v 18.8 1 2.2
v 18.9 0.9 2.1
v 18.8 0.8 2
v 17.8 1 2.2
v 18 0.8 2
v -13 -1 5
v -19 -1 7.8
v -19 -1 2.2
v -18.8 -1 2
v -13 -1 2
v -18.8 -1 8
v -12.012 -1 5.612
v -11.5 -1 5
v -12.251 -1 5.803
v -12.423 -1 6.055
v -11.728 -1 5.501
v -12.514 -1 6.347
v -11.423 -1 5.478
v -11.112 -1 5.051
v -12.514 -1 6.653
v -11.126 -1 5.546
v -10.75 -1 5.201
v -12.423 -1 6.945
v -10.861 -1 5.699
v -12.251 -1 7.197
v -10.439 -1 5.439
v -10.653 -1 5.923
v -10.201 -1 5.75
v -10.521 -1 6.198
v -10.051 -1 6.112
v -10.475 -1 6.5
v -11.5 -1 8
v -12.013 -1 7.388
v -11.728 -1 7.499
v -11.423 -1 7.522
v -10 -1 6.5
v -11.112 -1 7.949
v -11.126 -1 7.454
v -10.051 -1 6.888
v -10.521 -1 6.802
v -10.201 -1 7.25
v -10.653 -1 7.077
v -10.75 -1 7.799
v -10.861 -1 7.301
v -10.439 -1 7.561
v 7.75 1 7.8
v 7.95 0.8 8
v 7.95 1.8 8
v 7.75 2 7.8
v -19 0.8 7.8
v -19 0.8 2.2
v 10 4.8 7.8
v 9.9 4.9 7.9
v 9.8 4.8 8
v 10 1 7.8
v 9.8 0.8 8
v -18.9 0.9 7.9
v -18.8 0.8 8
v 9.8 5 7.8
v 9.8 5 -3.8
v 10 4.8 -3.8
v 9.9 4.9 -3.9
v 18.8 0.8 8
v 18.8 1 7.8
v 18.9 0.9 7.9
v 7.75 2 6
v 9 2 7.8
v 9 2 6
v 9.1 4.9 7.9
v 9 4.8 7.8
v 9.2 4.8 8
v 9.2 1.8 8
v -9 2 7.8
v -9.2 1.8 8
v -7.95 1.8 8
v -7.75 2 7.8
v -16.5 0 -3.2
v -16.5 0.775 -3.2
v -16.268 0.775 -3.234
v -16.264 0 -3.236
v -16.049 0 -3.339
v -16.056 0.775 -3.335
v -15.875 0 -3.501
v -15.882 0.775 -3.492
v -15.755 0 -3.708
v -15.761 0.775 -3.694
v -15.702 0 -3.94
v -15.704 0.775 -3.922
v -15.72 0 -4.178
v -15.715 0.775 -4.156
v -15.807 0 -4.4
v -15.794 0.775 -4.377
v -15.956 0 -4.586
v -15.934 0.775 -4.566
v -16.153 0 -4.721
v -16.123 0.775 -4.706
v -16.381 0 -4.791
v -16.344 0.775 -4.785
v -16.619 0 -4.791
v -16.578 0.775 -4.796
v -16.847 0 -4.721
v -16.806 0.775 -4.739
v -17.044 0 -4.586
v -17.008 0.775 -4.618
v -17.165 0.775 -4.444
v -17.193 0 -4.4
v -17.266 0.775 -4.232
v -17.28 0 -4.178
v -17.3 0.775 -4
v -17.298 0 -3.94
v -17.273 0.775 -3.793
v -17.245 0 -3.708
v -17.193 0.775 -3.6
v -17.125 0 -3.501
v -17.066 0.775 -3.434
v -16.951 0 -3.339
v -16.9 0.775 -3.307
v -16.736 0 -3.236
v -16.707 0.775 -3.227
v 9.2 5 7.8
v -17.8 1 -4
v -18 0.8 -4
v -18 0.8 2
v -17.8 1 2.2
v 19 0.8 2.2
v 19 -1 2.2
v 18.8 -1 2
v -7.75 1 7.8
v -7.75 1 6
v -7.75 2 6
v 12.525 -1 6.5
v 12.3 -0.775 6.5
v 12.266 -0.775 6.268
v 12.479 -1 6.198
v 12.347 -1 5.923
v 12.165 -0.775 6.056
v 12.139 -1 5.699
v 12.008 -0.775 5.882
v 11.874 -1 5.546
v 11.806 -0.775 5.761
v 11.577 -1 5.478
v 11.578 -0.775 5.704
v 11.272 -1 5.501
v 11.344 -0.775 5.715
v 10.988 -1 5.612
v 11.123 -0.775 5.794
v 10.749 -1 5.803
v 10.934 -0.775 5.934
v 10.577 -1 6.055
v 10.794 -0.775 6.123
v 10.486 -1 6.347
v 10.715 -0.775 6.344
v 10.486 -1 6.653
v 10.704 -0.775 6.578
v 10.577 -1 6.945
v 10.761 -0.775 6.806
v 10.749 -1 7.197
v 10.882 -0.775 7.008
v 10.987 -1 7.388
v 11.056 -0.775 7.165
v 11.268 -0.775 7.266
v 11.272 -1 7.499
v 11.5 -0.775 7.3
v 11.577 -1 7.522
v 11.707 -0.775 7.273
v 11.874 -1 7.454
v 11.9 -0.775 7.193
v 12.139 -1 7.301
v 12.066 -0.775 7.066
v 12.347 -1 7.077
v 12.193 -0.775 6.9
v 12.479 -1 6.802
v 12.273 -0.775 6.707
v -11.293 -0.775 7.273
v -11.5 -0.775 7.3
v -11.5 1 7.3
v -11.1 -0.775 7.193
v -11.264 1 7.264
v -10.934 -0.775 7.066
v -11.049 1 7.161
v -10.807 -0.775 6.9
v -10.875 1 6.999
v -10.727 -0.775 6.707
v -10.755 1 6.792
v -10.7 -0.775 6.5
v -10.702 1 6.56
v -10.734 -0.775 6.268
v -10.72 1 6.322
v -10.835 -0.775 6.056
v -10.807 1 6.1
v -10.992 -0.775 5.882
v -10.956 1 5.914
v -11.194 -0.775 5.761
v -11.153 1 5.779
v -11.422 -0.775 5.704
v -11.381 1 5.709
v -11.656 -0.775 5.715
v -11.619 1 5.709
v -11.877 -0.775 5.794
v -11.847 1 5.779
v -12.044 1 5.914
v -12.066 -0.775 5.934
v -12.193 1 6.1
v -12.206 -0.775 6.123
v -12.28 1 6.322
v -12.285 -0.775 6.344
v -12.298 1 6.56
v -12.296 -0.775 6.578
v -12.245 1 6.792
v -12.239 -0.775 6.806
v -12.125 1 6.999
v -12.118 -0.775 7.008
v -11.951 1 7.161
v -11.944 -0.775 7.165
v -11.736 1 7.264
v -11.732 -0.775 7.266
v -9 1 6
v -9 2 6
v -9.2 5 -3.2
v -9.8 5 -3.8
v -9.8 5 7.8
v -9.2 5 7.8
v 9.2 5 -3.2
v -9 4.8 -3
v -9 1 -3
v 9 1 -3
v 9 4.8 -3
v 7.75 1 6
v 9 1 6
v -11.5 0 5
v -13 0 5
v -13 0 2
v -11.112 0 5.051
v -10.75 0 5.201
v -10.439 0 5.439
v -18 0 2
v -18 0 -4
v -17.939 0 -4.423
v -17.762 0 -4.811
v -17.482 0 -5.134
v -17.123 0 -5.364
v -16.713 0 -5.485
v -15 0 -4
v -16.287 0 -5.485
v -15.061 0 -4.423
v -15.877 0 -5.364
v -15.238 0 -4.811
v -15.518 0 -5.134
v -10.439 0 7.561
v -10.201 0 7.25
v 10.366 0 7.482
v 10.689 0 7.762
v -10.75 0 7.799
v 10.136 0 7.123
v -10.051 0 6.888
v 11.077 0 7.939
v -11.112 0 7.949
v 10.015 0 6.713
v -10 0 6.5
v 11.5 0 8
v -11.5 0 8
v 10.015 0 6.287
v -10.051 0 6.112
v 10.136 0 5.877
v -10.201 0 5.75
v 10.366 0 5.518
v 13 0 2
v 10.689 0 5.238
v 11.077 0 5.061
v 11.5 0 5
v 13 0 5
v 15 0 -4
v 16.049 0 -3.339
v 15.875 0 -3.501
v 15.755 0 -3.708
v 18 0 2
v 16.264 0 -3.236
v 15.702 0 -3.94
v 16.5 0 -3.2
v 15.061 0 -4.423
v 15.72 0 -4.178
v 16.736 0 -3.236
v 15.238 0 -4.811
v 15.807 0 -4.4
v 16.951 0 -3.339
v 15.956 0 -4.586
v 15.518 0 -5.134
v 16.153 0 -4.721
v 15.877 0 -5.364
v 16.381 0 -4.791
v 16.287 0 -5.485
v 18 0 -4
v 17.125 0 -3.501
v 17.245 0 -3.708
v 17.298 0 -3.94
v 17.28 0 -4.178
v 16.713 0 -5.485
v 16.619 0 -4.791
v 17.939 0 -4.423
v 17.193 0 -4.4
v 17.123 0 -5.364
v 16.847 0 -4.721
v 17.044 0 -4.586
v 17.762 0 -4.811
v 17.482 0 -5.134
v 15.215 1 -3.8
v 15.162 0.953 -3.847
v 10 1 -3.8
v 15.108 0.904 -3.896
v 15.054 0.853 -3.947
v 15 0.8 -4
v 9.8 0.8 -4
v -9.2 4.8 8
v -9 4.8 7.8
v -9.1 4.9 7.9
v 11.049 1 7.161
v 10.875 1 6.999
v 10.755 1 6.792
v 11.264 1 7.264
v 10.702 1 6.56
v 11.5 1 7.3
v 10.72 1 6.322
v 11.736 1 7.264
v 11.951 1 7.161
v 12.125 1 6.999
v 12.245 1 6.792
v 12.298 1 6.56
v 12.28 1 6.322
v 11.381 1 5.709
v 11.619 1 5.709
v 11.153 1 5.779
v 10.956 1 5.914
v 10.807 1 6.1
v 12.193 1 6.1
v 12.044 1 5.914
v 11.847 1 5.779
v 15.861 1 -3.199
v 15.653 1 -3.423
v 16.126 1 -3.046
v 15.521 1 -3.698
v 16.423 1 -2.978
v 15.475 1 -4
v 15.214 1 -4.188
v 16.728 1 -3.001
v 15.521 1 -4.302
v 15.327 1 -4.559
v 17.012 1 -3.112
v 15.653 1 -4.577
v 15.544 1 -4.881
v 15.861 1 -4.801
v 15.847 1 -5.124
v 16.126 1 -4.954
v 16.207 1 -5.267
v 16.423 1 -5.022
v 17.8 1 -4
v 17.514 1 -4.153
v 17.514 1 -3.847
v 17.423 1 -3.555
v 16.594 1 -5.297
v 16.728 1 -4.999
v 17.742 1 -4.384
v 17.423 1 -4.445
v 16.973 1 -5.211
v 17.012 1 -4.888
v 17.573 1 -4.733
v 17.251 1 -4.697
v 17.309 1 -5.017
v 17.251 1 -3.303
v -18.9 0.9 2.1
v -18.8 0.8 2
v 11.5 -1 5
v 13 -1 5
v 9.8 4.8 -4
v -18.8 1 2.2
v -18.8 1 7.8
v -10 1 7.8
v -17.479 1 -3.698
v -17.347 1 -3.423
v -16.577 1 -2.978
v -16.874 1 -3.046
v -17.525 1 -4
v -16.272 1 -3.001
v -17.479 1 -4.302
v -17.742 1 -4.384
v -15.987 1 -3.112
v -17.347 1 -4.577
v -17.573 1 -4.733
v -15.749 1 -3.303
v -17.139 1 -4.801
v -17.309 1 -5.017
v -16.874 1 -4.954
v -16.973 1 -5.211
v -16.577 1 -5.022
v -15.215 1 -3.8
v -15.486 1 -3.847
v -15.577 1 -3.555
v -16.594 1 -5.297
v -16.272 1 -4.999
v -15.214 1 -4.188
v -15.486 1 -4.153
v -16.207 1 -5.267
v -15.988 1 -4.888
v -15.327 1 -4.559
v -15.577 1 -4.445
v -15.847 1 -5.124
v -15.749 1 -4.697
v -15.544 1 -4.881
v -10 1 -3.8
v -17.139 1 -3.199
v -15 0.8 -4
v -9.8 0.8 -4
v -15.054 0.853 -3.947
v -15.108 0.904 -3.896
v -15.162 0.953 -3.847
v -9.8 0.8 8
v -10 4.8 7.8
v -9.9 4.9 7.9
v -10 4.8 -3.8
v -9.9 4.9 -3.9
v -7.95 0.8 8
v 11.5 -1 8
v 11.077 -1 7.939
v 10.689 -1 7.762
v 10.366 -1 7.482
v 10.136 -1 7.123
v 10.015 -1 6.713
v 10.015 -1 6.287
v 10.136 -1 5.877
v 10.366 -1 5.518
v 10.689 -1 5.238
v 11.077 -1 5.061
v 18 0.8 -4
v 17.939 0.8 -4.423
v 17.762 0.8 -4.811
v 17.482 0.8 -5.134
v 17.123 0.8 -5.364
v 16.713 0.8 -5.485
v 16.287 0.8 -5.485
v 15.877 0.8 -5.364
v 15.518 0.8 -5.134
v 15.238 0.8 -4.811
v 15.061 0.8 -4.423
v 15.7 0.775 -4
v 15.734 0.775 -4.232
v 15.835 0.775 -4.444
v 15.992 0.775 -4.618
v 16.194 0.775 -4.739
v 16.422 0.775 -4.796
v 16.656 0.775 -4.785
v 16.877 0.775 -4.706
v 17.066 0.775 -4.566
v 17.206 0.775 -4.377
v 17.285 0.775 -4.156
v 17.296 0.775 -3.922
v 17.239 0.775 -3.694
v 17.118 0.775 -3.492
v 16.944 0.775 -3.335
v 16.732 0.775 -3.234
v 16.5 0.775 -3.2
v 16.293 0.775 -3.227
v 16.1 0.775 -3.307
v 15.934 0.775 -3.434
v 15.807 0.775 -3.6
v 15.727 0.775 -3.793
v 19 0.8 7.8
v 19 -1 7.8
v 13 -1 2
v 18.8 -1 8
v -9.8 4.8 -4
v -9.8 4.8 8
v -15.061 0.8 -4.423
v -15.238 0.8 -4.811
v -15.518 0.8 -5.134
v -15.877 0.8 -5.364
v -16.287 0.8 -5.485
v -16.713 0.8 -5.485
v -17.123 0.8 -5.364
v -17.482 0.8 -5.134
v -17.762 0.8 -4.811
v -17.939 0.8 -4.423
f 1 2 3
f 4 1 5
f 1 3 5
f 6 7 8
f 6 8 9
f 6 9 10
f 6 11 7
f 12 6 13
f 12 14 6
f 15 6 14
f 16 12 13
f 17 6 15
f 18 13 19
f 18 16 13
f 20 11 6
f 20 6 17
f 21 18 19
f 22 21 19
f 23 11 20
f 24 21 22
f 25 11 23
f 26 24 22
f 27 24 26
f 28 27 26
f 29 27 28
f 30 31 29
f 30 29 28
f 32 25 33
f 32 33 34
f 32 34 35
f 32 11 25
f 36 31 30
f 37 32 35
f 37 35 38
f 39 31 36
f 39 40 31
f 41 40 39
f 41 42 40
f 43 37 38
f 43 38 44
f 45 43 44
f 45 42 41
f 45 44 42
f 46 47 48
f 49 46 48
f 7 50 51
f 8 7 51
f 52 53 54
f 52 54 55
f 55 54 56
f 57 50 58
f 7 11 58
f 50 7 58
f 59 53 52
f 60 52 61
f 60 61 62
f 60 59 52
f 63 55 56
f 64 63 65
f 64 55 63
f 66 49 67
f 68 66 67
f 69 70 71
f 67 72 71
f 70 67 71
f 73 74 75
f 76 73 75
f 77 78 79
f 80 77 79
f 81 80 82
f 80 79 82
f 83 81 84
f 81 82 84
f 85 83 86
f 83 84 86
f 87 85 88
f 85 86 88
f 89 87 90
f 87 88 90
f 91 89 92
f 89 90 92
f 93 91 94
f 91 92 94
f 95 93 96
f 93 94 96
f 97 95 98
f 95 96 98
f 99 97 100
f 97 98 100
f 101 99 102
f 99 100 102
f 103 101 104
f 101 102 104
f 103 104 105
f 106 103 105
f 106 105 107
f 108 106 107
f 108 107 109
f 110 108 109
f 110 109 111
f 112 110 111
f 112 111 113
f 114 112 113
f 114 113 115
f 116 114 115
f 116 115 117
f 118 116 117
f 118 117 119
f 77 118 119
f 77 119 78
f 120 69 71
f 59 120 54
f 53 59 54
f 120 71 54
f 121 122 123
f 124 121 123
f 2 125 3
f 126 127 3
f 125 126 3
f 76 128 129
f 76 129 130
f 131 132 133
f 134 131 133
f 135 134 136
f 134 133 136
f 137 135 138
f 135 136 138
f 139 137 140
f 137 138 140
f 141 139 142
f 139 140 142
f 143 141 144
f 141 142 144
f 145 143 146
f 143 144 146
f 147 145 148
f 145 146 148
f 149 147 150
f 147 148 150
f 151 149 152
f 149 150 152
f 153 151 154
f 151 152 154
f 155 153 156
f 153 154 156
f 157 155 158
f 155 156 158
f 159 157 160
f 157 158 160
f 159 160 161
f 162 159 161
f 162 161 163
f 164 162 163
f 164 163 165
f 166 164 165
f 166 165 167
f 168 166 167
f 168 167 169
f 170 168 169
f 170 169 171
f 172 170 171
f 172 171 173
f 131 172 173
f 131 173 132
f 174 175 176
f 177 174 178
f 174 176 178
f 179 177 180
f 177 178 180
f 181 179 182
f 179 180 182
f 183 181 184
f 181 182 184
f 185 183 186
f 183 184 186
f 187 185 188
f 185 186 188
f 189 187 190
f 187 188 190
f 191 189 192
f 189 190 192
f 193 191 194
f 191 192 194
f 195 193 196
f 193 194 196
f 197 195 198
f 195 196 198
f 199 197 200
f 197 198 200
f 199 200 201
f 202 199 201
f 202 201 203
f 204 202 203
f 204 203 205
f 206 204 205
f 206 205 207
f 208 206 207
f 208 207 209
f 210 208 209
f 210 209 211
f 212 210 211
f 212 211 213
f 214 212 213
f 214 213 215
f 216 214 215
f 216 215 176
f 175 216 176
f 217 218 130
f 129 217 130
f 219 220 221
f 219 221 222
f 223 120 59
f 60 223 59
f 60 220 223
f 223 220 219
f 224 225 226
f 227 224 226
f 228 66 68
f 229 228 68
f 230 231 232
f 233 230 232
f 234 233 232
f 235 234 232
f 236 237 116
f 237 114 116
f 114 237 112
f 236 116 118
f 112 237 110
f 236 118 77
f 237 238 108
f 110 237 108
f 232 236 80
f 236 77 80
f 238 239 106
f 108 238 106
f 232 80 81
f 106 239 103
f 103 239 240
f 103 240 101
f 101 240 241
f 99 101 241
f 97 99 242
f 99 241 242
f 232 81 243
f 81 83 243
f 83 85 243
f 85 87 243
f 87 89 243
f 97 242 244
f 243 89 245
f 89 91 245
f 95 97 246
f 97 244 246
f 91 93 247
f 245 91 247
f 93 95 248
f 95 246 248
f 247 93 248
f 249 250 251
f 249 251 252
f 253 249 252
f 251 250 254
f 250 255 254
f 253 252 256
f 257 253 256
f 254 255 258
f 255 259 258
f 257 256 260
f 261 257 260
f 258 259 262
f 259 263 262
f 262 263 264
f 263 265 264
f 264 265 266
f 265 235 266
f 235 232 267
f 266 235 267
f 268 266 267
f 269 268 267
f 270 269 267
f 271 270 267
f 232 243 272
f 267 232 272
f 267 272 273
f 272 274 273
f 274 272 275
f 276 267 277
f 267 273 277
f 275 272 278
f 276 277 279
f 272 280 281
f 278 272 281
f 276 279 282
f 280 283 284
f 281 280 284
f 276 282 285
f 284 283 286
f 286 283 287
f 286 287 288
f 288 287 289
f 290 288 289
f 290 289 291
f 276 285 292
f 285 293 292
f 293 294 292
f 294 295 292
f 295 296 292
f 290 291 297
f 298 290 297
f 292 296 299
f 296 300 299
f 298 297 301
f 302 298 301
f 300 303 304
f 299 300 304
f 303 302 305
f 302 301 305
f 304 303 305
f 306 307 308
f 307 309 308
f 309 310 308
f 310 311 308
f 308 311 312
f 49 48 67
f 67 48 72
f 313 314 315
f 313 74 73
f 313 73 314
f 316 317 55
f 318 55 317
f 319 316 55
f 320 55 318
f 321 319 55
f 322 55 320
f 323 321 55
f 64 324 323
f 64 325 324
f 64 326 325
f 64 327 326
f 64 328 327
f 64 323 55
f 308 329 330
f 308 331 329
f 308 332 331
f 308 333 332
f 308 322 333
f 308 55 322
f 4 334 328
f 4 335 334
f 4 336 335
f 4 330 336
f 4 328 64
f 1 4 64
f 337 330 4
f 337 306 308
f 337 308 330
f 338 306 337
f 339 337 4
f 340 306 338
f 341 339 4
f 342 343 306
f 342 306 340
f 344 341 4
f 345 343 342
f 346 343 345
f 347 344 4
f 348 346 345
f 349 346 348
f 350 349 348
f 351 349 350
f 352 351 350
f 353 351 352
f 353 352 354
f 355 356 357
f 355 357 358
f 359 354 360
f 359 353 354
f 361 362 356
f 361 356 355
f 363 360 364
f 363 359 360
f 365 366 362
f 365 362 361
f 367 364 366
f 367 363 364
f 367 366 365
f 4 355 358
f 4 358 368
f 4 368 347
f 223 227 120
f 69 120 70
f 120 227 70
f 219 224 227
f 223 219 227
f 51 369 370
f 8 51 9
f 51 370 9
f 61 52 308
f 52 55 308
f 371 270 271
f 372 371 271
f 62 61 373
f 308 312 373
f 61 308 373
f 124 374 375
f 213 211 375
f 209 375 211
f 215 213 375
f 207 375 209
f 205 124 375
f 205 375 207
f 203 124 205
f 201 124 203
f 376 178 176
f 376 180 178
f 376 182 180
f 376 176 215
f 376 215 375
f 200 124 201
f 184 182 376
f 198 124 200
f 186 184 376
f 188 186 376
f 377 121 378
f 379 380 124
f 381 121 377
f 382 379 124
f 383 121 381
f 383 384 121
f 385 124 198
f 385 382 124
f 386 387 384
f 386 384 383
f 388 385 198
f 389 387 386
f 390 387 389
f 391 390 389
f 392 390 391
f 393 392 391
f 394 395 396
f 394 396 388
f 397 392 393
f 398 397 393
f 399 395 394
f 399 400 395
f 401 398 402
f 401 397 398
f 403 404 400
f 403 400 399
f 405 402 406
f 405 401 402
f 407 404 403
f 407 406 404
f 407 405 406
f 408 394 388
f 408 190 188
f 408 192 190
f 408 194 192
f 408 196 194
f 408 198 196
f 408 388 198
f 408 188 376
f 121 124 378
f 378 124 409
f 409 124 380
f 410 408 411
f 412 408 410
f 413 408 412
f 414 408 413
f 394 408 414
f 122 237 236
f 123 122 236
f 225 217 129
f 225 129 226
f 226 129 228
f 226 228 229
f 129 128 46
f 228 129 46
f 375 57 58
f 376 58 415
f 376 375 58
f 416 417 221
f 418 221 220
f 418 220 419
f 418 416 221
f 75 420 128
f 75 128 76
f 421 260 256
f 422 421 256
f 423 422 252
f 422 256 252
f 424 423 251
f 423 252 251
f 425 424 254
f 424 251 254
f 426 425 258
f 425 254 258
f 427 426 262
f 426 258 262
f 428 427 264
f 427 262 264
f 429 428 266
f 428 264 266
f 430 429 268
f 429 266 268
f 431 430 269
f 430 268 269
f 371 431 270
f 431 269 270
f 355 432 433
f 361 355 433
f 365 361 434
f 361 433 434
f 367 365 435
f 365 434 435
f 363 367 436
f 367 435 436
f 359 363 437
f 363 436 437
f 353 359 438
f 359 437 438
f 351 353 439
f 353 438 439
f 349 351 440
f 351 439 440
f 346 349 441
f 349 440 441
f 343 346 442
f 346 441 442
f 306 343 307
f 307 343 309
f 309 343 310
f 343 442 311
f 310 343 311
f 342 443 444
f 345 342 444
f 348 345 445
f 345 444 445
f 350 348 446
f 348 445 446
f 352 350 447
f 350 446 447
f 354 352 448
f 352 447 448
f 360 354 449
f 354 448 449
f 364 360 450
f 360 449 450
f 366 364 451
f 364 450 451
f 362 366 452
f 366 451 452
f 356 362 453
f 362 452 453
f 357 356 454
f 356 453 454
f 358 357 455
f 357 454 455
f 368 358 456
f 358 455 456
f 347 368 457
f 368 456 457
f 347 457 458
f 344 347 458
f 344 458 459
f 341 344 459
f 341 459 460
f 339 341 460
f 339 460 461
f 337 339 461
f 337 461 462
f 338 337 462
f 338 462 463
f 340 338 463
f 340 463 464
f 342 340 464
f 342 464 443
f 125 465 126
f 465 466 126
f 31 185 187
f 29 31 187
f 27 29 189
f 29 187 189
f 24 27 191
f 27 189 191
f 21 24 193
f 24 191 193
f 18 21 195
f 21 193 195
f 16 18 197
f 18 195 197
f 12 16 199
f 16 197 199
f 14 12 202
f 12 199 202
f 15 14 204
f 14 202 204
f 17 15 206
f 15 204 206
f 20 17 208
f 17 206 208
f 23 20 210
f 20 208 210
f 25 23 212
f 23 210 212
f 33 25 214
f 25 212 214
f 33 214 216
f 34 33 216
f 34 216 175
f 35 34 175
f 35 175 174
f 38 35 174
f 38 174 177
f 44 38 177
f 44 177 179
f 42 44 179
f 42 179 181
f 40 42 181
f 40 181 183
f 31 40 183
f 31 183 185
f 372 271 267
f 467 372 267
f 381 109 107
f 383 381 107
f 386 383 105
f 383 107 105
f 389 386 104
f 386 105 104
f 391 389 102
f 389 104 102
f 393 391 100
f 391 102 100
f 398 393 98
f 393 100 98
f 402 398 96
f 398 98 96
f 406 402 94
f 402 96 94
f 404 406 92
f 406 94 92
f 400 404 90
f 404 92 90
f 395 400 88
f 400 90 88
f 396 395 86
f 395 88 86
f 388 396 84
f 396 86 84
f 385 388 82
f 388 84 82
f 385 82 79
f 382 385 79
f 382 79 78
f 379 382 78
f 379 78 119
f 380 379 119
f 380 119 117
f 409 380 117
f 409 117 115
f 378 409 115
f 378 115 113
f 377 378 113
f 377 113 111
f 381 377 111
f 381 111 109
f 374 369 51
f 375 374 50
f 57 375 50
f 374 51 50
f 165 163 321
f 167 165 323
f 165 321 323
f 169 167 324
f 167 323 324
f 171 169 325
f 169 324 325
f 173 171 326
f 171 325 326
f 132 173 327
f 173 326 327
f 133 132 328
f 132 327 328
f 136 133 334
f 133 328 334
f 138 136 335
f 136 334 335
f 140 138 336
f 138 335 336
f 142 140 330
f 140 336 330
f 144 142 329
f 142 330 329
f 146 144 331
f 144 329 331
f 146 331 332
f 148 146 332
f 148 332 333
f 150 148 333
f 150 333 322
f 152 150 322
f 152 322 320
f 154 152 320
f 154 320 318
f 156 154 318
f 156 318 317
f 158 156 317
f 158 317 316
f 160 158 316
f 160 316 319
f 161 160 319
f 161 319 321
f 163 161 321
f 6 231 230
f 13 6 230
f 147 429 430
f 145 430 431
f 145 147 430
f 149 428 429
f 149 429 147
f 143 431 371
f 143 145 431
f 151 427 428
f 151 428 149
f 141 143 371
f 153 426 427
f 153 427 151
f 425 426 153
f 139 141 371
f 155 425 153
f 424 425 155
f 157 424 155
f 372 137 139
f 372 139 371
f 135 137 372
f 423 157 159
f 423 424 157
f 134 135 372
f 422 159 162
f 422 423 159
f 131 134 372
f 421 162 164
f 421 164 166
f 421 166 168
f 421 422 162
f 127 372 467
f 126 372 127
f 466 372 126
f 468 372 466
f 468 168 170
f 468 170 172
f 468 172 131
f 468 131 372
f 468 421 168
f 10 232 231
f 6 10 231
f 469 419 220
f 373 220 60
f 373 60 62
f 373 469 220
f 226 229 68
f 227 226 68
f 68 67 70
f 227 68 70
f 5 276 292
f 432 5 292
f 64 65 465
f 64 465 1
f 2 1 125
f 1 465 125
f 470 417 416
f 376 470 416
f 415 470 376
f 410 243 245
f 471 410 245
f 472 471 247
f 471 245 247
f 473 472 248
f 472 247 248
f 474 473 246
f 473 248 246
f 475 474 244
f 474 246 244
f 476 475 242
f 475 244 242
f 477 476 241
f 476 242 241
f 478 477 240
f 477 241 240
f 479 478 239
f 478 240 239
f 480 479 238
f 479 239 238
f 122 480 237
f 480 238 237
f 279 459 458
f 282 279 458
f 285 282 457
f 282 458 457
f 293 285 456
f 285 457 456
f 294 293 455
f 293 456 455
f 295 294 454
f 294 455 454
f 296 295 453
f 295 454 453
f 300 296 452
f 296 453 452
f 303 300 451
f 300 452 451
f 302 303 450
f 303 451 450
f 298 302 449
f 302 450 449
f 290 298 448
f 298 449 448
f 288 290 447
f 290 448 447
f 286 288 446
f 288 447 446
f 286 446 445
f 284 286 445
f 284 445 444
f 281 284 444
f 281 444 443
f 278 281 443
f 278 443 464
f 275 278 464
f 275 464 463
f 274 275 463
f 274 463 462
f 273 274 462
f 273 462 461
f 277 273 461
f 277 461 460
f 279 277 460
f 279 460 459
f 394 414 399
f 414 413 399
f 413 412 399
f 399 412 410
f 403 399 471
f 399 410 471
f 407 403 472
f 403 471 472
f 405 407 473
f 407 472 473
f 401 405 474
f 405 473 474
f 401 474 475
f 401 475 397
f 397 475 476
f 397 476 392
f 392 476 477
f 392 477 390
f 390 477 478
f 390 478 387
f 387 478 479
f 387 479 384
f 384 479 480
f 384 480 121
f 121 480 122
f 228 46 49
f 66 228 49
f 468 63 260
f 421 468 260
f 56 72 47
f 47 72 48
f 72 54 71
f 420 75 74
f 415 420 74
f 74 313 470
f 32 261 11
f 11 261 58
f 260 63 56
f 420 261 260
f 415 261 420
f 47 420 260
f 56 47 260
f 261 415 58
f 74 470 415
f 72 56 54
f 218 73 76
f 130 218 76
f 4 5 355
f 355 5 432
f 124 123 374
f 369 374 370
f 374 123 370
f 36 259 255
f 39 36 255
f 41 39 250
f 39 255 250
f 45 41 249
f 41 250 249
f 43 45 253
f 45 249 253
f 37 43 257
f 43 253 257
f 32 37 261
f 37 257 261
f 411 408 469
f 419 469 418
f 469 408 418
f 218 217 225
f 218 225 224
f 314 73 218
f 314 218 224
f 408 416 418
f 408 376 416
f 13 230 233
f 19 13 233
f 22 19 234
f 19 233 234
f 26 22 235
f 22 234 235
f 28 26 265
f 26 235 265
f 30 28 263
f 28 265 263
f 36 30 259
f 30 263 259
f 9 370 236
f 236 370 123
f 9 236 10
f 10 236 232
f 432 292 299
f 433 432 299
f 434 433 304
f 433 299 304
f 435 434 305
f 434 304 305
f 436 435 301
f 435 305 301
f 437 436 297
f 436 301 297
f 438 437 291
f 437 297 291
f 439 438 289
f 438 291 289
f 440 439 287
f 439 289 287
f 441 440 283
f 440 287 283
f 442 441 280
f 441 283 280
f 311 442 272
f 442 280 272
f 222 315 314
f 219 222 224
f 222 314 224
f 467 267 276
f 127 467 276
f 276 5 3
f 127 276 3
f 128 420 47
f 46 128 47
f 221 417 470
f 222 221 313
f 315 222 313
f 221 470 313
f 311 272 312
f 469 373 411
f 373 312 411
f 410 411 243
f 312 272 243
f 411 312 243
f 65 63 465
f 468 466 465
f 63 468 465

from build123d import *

# Parameters (mm, degrees)
SKETCH_1_W                   = 3
SKETCH_1_H                   = 1
SKETCH_1_H_2                 = 2
SKETCH_1_W_2                 = 30
EXTRUDE_1_DEPTH              = 1
SKETCH_2_W                   = 20
SKETCH_2_H                   = 12
SKETCH_2_W_2                 = 18
SKETCH_2_H_2                 = 10
EXTRUDE_4_DEPTH              = 4
SKETCH_8_W                   = 18
SKETCH_8_H                   = 4
CUT_EXTRUDE_2_DEPTH          = 4
SKETCH_9_W                   = 1.25
SKETCH_9_H                   = 1
EXTRUDE_5_DEPTH              = 2
EXTRUDE_6_DEPTH              = 1
HOLE_WIZARD_M2_1_D           = 1.6
HOLE_WIZARD_M2_1_DEPTH       = 5.5
HOLE_WIZARD_M2_1_CSINK_D     = 2.05
HOLE_WIZARD_M2_1_CSINK_ANGLE = 90
HOLE_WIZARD_M2_1_TIP         = 0.480688495
HOLE_WIZARD_M2_2_D           = 1.6
HOLE_WIZARD_M2_2_CSINK_D     = 2.05
HOLE_WIZARD_M2_2_CSINK_ANGLE = 90
CHAMFER_1_SIZE               = 0.2
CHAMFER_2_SIZE               = 0.2
CHAMFER_3_SIZE               = 0.2
CHAMFER_4_SIZE               = 0.2
CHAMFER_5_SIZE               = 0.2
SKETCH_16_R                  = 0.8
EXTRUDE_7_DEPTH              = 3
SKETCH_17_R                  = 0.8
CUT_EXTRUDE_3_DEPTH          = 22


with BuildPart() as part:
    # 草图1 → 凸台-拉伸1 (new body)
    with BuildSketch(Plane(origin=(0, 0, 0), x_dir=(1, 0, 0), z_dir=(0, 1, 0))):
        with BuildLine():
            ThreePointArc((-15, 4), (-16.5, 5.5), (-18, 4))
            Line((-18, 4), (-15, 4))
        make_face()
        with BuildLine():
            ThreePointArc((-15, 4), (-16.5, 2.5), (-18, 4))
            Line((-18, 4), (-18, -1))
            Line((-18, -1), (-15, -1))
            Line((-15, -1), (-15, -2))
            Line((-15, -2), (15, -2))
            Line((15, -2), (15, -1))
            Line((15, -1), (18, -1))
            Line((18, -1), (18, 4))
            ThreePointArc((18, 4), (16.5, 2.5), (15, 4))
            Line((15, 4), (-15, 4))
        make_face()
        with BuildLine():
            Line((-15, 4), (-18, 4))
            ThreePointArc((-18, 4), (-16.5, 2.5), (-15, 4))
        make_face()
        with Locations((-16.5, -1.5)):
            Rectangle(SKETCH_1_W, SKETCH_1_H)
        with BuildLine():
            ThreePointArc((18, 4), (16.5, 5.5), (15, 4))
            Line((15, 4), (18, 4))
        make_face()
        with BuildLine():
            Line((18, 4), (15, 4))
            ThreePointArc((15, 4), (16.5, 2.5), (18, 4))
        make_face()
        with Locations((-16.5, -3)):
            Rectangle(SKETCH_1_W, SKETCH_1_H_2)
        Polygon((-18, -4), (-18, -2), (-19, -2), (-19, -8), (19, -8), (19, -2), (18, -2), (18, -4), (15, -4), (-15, -4), align=None)
        with Locations((0, -3)):
            Rectangle(SKETCH_1_W_2, SKETCH_1_H_2)
        with Locations((16.5, -1.5)):
            Rectangle(SKETCH_1_W, SKETCH_1_H)
        with Locations((16.5, -3)):
            Rectangle(SKETCH_1_W, SKETCH_1_H_2)
    extrude(amount=EXTRUDE_1_DEPTH)

    # 草图2 → 凸台-拉伸4 (add)
    with BuildSketch(Plane(origin=(0, 1, 0), x_dir=(1, 0, 0), z_dir=(0, 1, 0))):
        with Locations((0, -2)):
            Rectangle(SKETCH_2_W, SKETCH_2_H)
        with Locations((0, -2)):
            Rectangle(SKETCH_2_W_2, SKETCH_2_H_2, mode=Mode.SUBTRACT)
    extrude(amount=EXTRUDE_4_DEPTH)

    # 草图8 → 切除-拉伸2 (cut)
    with BuildSketch(Plane.XY.offset(8)):
        with Locations((0, 3)):
            Rectangle(SKETCH_8_W, SKETCH_8_H)
    extrude(amount=-CUT_EXTRUDE_2_DEPTH, mode=Mode.SUBTRACT)

    # 草图9 → 凸台-拉伸5 (add)
    with BuildSketch(Plane.XY.offset(8)):
        with Locations((-8.375, 1.5)):
            Rectangle(SKETCH_9_W, SKETCH_9_H)
        with Locations((8.375, 1.5)):
            Rectangle(SKETCH_9_W, SKETCH_9_H)
    extrude(amount=-EXTRUDE_5_DEPTH)

    # 草图10 → 凸台-拉伸6 (add)
    with BuildSketch(Plane.XZ):
        Polygon((-13, 8), (-19, 8), (-19, 2), (-18, 2), (-13, 2), (-13, 5), (-13, 6.5), align=None)
        with BuildLine():
            ThreePointArc((-11.5, 5), (-12.560660172, 5.439339828), (-13, 6.5))
            Line((-13, 6.5), (-13, 5))
            Line((-13, 5), (-11.5, 5))
        make_face()
        with BuildLine():
            ThreePointArc((-11.5, 8), (-12.560660172, 7.560660172), (-13, 6.5))
            ThreePointArc((-13, 6.5), (-12.560660172, 5.439339828), (-11.5, 5))
            Line((-11.5, 5), (-11.5, 8))
        make_face()
        with BuildLine():
            ThreePointArc((-10, 6.5), (-10.439339828, 7.560660172), (-11.5, 8))
            Line((-11.5, 8), (-11.5, 5))
            ThreePointArc((-11.5, 5), (-10.439339828, 5.439339828), (-10, 6.5))
        make_face()
        with BuildLine():
            Line((-11.5, 8), (-13, 8))
            Line((-13, 8), (-13, 6.5))
            ThreePointArc((-13, 6.5), (-12.560660172, 7.560660172), (-11.5, 8))
        make_face()
        with BuildLine():
            ThreePointArc((13, 6.5), (12.560660172, 7.560660172), (11.5, 8))
            Line((11.5, 8), (11.5, 5))
            ThreePointArc((11.5, 5), (12.560660172, 5.439339828), (13, 6.5))
        make_face()
        with BuildLine():
            Line((11.5, 5), (11.5, 8))
            ThreePointArc((11.5, 8), (10, 6.5), (11.5, 5))
        make_face()
        with BuildLine():
            Line((13, 8), (11.5, 8))
            ThreePointArc((11.5, 8), (12.560660172, 7.560660172), (13, 6.5))
            Line((13, 6.5), (13, 8))
        make_face()
        with BuildLine():
            ThreePointArc((13, 6.5), (12.560660172, 5.439339828), (11.5, 5))
            Line((11.5, 5), (13, 5))
            Line((13, 5), (13, 6.5))
        make_face()
        Polygon((19, 8), (13, 8), (13, 6.5), (13, 5), (13, 2), (18, 2), (19, 2), align=None)
    extrude(amount=EXTRUDE_6_DEPTH)

    # M2 螺纹孔1
    with Locations(Plane(origin=(0, 1, 0), x_dir=(1, 0, 0), z_dir=(0, 1, 0))):
        with Locations((-16.5, 4), (16.5, 4)):
            CounterSinkHole(HOLE_WIZARD_M2_1_D / 2, HOLE_WIZARD_M2_1_CSINK_D / 2, depth=HOLE_WIZARD_M2_1_DEPTH, counter_sink_angle=HOLE_WIZARD_M2_1_CSINK_ANGLE)
            with Locations((0, 0, -(HOLE_WIZARD_M2_1_DEPTH + HOLE_WIZARD_M2_1_TIP / 2))):  # 118° drill point
                Cone(0, HOLE_WIZARD_M2_1_D / 2, HOLE_WIZARD_M2_1_TIP, mode=Mode.SUBTRACT)

    # M2 螺纹孔2 (through all)
    with Locations(Plane(origin=(0, -1, 0), x_dir=(-1, 0, 0), z_dir=(0, -1, 0))):
        with Locations((11.5, -6.5), (-11.5, -6.5)):
            CounterSinkHole(HOLE_WIZARD_M2_2_D / 2, HOLE_WIZARD_M2_2_CSINK_D / 2, counter_sink_angle=HOLE_WIZARD_M2_2_CSINK_ANGLE)

    # 倒角1
    chamfer_1_edges = [part.edges().sort_by_distance(p)[0] for p in [
        (-10, 5, 2),
        (-9.5, 5, 8),
        (10, 5, 2),
        (0, 5, -4),
        (0, 5, -3),
        (-9, 5, 2.5),
        (9, 5, 2.5),
        (9.5, 5, 8),
    ]]
    chamfer(chamfer_1_edges, length=CHAMFER_1_SIZE)

    # 倒角2
    chamfer_2_edges = [part.edges().sort_by_distance(p)[0] for p in [
        (-18, 1, -1),
        (-18.5, 1, 2),
        (-19, 1, 5),
        (-14.5, 1, 8),
        (19, 1, 5),
        (18.5, 1, 2),
        (12.5, 1, -4),
        (14.5, 1, 8),
        (18, 1, -1),
        (-12.5, 1, -4),
        (16.5, 1, -5.5),
        (-16.5, 1, -5.5),
    ]]
    chamfer(chamfer_2_edges, length=CHAMFER_2_SIZE)

    # 倒角3
    chamfer_3_edges = [part.edges().sort_by_distance(p)[0] for p in [
        (7.75, 1.5, 8),
        (-9, 3.4, 8),
        (-10, 2.8, 8),
        (10, 2.8, 8),
        (0, 1, 8),
        (-7.75, 1.5, 8),
        (-8.375, 2, 8),
        (9, 3.4, 8),
        (8.375, 2, 8),
    ]]
    chamfer(chamfer_3_edges, length=CHAMFER_3_SIZE)

    # 倒角4
    chamfer_4_edges = [part.edges().sort_by_distance(p)[0] for p in [
        (-19, -0.1, 8),
        (19, -0.1, 8),
        (-19, -0.1, 2),
        (19, -0.1, 2),
    ]]
    chamfer(chamfer_4_edges, length=CHAMFER_4_SIZE)

    # 倒角5
    chamfer_5_edges = [part.edges().sort_by_distance(p)[0] for p in [
        (-10, 2.8, -4),
        (10, 2.8, -4),
    ]]
    chamfer(chamfer_5_edges, length=CHAMFER_5_SIZE)

    # 草图16 → 凸台-拉伸7 (add)
    with BuildSketch(Plane(origin=(0, 1, 0), x_dir=(1, 0, 0), z_dir=(0, 1, 0))):
        with Locations(Location((16.5, 4, 0), (0, 0, 270))):
            Circle(SKETCH_16_R)
        with Locations(Location((11.5, -6.5, 0), (0, 0, 270))):
            Circle(SKETCH_16_R)
        with Locations(Location((-11.5, -6.5, 0), (0, 0, 270))):
            Circle(SKETCH_16_R)
        with Locations(Location((-16.5, 4, 0), (0, 0, 270))):
            Circle(SKETCH_16_R)
    extrude(amount=-EXTRUDE_7_DEPTH)

    # 草图17 → 切除-拉伸3 (cut, through all)
    with BuildSketch(Plane(origin=(0, 1, 0), x_dir=(1, 0, 0), z_dir=(0, 1, 0))):
        with Locations(Location((-16.5, 4, 0), (0, 0, 270))):
            Circle(SKETCH_17_R)
        with Locations(Location((-11.5, -6.5, 0), (0, 0, 270))):
            Circle(SKETCH_17_R)
        with Locations(Location((11.5, -6.5, 0), (0, 0, 270))):
            Circle(SKETCH_17_R)
        with Locations(Location((16.5, 4, 0), (0, 0, 270))):
            Circle(SKETCH_17_R)
    extrude(amount=-CUT_EXTRUDE_3_DEPTH, mode=Mode.SUBTRACT)


solid = part.part
